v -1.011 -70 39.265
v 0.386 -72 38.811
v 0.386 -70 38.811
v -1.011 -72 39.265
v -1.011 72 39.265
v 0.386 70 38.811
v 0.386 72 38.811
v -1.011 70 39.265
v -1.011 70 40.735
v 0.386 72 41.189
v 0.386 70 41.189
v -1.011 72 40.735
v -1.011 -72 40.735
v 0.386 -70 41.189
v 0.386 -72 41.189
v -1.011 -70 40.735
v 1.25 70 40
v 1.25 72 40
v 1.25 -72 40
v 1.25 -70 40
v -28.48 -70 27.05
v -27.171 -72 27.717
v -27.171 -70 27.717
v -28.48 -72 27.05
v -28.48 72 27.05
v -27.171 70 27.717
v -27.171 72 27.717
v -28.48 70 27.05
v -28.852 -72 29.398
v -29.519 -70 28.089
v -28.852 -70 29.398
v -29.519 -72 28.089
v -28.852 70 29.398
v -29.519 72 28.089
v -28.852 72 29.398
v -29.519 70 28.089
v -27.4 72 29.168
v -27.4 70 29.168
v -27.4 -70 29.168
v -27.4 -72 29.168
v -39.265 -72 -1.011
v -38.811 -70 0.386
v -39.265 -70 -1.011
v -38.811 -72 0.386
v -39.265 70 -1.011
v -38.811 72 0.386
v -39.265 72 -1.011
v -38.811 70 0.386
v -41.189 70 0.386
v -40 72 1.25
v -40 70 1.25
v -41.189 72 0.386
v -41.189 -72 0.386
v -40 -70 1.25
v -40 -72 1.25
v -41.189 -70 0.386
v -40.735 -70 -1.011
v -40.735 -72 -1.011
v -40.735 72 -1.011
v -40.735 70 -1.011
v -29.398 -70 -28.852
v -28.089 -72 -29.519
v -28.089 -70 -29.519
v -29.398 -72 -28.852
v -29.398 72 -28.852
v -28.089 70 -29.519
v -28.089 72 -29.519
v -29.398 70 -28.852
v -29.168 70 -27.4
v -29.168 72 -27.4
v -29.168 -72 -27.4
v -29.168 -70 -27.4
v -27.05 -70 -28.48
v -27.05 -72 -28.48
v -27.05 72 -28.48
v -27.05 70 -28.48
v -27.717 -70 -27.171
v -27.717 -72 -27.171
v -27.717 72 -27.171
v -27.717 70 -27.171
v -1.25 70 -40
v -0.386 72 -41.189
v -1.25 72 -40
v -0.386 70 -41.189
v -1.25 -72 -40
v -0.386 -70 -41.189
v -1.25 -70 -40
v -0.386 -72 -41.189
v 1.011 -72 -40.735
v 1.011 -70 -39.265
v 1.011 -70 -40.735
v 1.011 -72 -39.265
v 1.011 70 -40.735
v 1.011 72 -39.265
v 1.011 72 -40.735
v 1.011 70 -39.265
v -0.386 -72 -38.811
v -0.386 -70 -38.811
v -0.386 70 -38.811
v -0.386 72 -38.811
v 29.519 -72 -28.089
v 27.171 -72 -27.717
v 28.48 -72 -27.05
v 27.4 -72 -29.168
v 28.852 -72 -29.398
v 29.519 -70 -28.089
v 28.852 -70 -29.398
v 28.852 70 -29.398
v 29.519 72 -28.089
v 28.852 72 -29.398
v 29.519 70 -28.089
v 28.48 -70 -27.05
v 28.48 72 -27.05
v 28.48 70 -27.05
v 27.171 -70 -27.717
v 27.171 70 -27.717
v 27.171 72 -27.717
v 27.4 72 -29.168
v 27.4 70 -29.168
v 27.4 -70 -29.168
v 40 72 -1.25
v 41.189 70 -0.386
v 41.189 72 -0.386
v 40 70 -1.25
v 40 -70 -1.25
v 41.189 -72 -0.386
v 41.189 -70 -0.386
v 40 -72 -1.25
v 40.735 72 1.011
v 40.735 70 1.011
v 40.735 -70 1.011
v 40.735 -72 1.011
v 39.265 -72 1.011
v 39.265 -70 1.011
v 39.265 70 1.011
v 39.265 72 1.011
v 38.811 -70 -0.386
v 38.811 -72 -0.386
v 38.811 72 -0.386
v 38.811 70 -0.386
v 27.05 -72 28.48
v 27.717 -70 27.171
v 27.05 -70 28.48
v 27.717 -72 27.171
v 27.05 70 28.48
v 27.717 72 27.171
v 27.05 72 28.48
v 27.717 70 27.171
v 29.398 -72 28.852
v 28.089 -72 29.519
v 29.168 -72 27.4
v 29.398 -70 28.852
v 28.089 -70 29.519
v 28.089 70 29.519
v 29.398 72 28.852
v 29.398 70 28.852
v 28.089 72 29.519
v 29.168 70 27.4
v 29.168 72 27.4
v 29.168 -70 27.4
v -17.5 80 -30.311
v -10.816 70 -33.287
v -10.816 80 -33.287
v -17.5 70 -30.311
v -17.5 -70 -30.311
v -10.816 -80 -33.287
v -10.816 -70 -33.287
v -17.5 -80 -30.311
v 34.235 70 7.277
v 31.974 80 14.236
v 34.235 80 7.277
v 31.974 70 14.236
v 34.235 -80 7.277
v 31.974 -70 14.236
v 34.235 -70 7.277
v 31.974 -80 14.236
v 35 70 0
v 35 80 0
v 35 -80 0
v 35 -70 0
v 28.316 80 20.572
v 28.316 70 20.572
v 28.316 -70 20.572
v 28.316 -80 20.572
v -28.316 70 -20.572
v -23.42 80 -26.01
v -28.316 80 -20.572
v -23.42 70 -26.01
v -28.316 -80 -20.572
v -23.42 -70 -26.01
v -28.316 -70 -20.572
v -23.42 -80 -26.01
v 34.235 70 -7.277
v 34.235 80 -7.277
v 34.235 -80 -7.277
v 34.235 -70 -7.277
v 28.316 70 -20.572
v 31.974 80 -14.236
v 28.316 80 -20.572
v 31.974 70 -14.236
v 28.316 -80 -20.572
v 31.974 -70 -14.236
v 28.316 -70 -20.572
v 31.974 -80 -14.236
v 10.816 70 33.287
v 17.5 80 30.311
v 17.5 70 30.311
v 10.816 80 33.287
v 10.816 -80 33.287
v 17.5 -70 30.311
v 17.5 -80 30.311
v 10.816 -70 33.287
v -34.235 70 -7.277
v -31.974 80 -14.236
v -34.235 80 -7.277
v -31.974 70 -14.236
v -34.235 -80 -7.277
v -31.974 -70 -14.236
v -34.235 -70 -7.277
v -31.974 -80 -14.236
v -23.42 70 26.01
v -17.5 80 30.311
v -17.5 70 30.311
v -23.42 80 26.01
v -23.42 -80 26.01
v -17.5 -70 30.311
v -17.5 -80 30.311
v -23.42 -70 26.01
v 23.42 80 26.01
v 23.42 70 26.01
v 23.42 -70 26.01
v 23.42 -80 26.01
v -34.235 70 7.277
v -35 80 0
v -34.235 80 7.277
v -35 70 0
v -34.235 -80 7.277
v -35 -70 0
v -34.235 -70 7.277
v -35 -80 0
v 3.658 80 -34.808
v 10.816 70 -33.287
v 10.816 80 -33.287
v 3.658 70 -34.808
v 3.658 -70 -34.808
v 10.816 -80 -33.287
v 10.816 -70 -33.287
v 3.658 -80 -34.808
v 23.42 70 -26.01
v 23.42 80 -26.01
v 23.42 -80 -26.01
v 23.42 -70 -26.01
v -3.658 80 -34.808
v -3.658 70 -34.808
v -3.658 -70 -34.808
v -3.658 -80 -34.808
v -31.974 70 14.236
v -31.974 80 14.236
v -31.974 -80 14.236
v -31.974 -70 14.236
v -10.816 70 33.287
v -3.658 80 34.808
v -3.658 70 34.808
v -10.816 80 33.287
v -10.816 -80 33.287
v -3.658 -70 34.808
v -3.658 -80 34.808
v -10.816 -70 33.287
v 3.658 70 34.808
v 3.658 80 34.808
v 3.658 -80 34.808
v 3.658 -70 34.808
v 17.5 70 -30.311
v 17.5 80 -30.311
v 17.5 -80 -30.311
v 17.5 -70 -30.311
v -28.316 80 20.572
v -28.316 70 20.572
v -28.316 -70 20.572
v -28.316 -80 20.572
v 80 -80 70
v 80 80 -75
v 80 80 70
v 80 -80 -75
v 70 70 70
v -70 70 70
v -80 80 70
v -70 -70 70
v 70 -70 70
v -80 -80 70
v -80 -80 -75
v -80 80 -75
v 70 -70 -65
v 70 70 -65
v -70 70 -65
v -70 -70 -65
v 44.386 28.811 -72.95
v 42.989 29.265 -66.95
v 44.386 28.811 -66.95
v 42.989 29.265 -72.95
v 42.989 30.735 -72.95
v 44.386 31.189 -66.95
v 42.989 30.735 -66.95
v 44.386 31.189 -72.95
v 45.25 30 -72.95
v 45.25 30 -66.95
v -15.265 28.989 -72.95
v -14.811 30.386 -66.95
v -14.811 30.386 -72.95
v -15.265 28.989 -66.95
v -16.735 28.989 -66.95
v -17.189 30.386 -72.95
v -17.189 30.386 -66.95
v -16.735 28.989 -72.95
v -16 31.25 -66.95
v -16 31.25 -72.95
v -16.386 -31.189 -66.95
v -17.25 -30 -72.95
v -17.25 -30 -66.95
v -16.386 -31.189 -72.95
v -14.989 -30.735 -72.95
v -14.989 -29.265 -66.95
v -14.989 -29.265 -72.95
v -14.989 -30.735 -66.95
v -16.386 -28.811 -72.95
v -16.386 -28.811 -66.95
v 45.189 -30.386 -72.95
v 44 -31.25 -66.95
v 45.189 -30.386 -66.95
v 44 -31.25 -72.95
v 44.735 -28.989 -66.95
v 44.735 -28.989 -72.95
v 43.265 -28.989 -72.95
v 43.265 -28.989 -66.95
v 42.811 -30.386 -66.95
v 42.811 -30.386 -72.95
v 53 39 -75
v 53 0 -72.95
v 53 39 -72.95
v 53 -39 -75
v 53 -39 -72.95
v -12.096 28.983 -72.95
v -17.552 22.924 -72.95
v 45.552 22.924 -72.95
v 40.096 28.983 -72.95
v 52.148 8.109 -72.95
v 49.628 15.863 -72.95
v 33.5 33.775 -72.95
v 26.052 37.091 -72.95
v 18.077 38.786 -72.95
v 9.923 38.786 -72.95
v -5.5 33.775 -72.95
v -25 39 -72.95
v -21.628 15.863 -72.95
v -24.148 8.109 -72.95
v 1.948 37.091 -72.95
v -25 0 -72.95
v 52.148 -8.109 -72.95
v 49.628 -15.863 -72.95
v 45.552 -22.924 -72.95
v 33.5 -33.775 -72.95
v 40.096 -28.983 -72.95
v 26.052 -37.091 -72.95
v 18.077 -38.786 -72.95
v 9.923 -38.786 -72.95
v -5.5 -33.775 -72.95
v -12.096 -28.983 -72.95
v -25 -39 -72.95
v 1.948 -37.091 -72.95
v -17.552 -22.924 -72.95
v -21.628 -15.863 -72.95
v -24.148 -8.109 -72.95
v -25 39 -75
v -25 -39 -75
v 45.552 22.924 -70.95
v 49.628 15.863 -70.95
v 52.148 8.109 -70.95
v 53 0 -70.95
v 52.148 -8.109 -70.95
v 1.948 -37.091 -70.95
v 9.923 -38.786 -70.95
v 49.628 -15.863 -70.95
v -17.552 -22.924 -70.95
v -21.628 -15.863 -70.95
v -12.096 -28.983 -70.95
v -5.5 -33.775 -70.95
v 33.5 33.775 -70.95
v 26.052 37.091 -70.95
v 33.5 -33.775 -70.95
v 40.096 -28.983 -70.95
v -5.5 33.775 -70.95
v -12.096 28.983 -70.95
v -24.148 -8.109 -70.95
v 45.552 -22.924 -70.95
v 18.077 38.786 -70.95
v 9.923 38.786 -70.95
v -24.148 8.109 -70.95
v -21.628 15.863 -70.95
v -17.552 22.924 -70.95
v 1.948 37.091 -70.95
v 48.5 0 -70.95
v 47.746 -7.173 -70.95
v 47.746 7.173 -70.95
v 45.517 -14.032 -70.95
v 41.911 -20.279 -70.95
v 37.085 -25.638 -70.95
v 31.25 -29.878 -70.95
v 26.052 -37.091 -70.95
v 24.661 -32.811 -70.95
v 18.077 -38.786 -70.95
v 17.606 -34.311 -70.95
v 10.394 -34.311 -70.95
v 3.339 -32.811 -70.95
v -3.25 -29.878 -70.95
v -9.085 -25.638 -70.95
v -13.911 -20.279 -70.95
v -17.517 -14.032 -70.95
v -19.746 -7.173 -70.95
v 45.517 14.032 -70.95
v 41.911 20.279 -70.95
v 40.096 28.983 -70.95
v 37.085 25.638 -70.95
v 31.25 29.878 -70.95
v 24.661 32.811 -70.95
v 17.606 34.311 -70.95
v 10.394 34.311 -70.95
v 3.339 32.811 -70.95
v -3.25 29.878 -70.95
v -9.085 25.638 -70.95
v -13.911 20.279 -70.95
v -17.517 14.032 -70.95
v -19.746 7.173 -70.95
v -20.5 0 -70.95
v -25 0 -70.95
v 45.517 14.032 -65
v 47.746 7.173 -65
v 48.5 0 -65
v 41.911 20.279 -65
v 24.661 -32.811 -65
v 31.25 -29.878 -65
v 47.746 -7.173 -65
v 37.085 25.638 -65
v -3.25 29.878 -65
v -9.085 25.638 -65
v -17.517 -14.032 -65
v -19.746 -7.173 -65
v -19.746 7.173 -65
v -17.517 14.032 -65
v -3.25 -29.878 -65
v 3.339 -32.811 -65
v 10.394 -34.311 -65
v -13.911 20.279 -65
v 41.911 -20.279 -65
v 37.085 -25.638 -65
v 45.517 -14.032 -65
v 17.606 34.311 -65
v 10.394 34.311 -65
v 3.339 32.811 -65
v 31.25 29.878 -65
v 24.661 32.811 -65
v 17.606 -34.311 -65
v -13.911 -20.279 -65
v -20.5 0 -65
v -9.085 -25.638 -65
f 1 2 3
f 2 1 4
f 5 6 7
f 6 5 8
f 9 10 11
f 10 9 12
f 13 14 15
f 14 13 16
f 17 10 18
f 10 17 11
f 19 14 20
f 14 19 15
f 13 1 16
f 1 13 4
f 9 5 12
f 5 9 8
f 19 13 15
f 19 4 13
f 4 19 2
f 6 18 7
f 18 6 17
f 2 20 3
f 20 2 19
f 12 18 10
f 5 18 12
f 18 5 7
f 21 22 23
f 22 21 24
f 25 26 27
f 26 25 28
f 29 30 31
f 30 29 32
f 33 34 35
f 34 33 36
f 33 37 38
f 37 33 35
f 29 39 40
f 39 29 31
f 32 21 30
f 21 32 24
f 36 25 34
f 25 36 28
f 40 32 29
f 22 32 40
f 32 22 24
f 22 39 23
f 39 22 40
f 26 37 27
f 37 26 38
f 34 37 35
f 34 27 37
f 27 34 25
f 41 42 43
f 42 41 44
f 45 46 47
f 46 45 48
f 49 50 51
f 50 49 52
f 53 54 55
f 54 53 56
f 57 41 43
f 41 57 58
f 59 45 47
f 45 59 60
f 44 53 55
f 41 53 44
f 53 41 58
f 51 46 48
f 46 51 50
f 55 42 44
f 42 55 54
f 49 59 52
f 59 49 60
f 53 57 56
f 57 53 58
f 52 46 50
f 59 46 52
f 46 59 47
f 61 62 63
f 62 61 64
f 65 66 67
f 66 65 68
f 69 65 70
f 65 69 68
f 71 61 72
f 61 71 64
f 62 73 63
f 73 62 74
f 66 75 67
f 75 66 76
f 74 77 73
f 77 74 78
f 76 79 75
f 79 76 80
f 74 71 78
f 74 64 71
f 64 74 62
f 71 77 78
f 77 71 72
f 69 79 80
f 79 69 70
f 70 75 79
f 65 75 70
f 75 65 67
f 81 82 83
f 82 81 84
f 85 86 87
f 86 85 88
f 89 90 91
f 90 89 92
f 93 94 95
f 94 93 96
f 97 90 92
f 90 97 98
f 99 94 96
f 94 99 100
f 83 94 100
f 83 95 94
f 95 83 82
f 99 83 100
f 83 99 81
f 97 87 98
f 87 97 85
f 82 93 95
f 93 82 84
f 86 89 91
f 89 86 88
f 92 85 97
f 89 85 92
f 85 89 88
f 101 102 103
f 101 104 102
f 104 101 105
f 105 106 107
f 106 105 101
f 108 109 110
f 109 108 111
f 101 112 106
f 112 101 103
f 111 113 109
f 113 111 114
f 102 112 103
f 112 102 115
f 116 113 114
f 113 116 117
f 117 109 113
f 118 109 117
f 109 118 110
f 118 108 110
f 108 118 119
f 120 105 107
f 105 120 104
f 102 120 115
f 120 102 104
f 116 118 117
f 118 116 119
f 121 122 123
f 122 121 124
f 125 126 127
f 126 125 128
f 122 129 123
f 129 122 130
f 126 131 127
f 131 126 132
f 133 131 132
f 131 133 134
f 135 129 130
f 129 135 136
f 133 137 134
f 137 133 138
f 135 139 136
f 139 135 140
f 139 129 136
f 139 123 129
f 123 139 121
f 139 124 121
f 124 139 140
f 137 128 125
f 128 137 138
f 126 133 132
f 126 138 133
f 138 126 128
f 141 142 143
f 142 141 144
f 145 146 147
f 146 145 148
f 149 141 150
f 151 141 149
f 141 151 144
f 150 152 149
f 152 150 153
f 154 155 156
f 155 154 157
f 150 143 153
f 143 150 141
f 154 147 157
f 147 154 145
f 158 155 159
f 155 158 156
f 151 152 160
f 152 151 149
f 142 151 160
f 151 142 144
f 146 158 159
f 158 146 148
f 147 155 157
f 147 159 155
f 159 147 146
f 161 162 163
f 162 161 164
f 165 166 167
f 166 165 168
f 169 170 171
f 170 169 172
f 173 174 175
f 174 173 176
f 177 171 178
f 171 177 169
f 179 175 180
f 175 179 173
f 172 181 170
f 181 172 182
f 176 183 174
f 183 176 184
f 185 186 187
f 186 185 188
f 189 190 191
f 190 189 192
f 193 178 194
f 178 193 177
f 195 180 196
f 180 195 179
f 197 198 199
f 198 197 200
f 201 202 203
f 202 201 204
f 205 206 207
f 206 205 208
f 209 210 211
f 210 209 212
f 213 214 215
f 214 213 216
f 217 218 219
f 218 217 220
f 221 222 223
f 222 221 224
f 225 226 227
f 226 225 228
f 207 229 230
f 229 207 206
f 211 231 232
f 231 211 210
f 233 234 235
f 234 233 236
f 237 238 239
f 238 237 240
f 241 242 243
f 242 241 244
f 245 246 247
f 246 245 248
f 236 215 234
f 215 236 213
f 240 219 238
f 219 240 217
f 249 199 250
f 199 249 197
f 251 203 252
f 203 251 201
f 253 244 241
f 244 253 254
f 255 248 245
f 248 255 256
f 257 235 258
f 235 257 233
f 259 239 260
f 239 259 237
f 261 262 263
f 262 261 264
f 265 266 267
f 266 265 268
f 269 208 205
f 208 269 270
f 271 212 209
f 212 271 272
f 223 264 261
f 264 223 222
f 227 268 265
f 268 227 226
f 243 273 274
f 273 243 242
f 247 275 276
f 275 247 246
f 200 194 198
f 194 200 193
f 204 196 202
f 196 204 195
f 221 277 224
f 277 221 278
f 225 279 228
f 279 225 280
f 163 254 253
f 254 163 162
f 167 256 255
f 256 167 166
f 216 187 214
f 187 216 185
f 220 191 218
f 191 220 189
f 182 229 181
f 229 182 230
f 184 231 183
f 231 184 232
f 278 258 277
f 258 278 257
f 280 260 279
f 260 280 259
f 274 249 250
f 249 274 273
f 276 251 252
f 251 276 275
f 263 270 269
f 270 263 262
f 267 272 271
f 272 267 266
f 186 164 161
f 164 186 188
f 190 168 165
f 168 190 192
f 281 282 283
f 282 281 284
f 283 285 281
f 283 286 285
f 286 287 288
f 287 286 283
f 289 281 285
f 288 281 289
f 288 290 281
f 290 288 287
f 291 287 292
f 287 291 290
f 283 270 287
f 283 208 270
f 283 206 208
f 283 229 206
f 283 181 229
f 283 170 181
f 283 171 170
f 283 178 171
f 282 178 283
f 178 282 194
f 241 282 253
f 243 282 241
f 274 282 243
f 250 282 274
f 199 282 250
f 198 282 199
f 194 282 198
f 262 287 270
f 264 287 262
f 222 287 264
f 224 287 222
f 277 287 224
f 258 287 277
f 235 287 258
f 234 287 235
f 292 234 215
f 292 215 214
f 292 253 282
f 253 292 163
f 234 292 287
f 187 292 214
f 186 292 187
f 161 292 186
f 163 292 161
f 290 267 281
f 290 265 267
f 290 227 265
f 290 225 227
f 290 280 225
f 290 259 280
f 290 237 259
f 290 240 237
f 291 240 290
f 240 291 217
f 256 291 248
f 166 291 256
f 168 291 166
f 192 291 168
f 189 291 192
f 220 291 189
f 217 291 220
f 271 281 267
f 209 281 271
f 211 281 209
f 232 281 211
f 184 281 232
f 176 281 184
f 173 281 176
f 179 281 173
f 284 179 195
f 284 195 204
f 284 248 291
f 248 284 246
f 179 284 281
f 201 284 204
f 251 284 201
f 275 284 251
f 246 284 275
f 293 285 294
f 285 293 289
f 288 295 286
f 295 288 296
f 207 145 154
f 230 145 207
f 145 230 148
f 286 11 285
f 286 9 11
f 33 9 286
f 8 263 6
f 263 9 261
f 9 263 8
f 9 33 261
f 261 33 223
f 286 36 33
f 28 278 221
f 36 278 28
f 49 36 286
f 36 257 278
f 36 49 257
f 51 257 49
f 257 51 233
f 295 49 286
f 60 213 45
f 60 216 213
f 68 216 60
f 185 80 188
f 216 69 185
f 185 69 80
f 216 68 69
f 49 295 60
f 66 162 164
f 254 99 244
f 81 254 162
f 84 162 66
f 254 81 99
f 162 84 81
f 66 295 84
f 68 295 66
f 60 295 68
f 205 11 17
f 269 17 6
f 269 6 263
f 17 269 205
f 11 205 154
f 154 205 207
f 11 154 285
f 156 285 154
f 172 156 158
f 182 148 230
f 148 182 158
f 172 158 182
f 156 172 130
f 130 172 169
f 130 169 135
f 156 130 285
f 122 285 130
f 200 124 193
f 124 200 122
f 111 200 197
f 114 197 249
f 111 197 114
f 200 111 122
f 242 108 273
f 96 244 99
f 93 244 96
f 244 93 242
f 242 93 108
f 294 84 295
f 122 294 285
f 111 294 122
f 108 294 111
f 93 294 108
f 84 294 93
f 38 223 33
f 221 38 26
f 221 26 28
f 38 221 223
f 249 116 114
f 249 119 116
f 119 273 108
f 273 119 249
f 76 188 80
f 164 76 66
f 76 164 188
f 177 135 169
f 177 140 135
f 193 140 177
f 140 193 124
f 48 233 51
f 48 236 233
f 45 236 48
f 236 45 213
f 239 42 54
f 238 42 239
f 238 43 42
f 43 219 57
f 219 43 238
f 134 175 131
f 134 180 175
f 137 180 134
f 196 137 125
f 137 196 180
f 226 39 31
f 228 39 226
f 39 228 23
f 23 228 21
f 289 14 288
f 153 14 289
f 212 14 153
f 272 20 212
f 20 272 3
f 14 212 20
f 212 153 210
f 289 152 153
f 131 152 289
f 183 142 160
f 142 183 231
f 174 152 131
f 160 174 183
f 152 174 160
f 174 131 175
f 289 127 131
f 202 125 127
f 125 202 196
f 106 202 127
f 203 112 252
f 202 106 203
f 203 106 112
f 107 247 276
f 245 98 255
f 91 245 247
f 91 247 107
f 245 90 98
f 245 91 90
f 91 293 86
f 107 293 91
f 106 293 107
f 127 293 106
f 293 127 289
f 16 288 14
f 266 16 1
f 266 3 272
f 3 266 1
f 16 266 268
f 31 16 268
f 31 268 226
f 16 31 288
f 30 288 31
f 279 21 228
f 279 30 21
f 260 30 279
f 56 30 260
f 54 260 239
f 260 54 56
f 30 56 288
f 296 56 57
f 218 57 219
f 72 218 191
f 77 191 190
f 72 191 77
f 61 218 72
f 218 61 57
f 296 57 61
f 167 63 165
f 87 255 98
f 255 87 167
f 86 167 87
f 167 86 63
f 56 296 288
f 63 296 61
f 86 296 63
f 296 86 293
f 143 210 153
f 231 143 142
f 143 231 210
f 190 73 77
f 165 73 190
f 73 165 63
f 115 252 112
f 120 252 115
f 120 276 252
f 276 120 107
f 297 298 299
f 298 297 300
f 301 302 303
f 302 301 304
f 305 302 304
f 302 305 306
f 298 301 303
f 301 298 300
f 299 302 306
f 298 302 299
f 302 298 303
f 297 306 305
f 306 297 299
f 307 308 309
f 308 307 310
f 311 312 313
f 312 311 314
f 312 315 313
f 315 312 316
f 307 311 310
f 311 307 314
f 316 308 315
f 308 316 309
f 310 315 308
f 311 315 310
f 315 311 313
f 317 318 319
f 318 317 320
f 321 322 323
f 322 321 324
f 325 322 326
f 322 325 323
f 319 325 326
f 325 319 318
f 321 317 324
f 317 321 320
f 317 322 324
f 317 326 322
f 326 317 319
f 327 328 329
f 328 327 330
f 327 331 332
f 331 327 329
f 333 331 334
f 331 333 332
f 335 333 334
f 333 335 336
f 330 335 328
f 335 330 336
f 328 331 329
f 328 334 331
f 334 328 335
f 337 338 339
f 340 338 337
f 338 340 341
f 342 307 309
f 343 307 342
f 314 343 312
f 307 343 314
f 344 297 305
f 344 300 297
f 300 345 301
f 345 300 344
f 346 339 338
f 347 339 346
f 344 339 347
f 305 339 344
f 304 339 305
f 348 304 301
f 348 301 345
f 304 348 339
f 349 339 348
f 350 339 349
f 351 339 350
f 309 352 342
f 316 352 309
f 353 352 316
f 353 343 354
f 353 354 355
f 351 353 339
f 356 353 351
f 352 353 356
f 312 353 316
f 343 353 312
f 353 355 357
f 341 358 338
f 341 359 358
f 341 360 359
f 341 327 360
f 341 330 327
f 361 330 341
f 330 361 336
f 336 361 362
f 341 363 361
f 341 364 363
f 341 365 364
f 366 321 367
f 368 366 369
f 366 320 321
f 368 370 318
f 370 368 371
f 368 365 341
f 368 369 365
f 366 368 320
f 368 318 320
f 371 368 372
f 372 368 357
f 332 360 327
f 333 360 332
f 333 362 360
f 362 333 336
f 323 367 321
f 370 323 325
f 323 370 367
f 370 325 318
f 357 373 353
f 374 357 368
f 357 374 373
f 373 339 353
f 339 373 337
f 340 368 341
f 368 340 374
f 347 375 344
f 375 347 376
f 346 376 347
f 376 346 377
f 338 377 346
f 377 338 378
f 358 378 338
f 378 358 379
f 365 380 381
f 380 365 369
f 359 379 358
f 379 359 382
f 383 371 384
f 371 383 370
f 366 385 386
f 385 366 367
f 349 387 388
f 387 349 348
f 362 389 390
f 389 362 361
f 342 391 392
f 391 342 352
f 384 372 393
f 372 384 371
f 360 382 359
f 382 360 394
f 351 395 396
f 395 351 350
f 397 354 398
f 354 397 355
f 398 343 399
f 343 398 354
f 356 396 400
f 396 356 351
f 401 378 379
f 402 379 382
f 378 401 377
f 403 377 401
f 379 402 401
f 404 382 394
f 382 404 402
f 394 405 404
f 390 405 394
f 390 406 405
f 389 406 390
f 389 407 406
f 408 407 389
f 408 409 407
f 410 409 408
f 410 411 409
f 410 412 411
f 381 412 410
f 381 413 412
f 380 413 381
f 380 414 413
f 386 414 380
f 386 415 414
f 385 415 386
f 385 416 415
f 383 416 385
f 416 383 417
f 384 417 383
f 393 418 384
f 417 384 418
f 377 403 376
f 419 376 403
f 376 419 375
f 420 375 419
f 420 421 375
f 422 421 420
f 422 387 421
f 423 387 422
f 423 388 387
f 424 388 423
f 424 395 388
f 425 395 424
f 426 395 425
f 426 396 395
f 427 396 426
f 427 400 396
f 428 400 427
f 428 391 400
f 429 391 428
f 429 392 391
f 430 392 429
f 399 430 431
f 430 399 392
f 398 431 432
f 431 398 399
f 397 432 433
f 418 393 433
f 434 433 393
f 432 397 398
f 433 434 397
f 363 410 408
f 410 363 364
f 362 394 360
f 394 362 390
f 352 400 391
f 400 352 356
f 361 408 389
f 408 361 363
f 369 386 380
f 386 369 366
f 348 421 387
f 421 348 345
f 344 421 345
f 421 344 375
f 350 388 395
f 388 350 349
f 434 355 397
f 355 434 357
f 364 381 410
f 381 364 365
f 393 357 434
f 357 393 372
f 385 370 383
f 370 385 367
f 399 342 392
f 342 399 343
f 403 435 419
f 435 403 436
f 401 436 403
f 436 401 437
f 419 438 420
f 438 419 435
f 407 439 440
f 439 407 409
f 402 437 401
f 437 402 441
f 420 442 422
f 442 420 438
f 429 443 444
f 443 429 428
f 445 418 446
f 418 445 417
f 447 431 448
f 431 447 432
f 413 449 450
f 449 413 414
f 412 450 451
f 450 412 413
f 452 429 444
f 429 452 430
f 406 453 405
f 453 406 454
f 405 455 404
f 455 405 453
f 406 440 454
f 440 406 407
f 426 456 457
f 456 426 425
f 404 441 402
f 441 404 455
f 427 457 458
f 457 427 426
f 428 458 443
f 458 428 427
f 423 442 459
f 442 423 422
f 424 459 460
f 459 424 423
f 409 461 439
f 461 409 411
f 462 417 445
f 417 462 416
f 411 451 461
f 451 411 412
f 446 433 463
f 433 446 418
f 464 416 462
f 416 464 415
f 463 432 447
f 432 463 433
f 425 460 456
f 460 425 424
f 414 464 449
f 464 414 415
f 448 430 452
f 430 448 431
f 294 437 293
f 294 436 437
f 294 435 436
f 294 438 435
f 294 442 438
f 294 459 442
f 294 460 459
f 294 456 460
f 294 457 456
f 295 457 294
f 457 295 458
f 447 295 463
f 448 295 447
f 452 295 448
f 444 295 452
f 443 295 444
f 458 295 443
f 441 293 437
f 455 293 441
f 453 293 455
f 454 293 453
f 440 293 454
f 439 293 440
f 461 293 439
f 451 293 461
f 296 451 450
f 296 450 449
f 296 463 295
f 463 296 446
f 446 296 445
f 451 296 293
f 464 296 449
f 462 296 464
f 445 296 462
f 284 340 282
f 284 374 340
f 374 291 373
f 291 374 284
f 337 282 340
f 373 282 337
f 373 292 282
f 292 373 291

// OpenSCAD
// Y trafo screw dist  = 46mm
// Z trafo max thic    = 38mm
// Y pot-pot dist      = 18mm
// Z pot front depth   =  5mm

tol=0.1;    // [mm]
Ds  = 69;   // speaker
DsH =2.5;   // holes
SQs = 78;   // square
SQh = 60;     // sq for holes
Dm  = 70;   // membrane
perf = 4;   // perforations
width=10;   // thickness
prop = 2;
xlen = prop*Dm;
ylen = prop*Dm;
zlen = prop*Dm;
screwQuant = 8;
difference()
{
    cube([xlen+2*width, ylen+2*width, zlen],center = true);
    
    cube([xlen, ylen, zlen+tol], center = true);
    
    rotate([90,0,0])
    {
        cylinder(h=ylen+2*width+tol, d=Dm, center=true);
        for(i=[0:1:screwQuant-1])
        {
            rotate([0,0,i*360/screwQuant])
            {
                translate([0,DsH*2+Dm/2,0])
                {
                    cylinder(h=ylen+perf, d=DsH, center=true);
                }
            }
        }
    }
    /*rotate([0,0,0])
    {
        cylinder(h=xlen+2*width+tol, d=Dm, center=true);
        for(i=[0:1:screwQuant-1])
        {
            rotate([0,0,i*360/screwQuant])
            {
                translate([0,DsH*2+Dm/2,0])
                {
                    cylinder(h=ylen+perf, d=DsH, center=true);
                }
            }
        }
    }*/
}

translate([0,0,-zlen/2])
{
    difference()
    {
        cube([xlen+2*width,ylen+2*width,width],center=true);
        
        translate([0.1*xlen,0,0])
        {
            cylinder(h=width+tol, d=Ds, center=true);
            translate([0,0,(-width)/2])
            {
                cube([SQs,SQs,perf+tol],center=true);
                cylinder(h=2*perf+tol, d=SQs, center=true);
                
                for(i=[0:90:270])
                {
                    rotate([0,0,i])
                    {
                        translate([SQh/2,SQh/2,0])
                        {
                            cylinder(h=4*perf+tol, d=DsH, center=true);
                        }
                    }
                }
            }
        }
    }
}
